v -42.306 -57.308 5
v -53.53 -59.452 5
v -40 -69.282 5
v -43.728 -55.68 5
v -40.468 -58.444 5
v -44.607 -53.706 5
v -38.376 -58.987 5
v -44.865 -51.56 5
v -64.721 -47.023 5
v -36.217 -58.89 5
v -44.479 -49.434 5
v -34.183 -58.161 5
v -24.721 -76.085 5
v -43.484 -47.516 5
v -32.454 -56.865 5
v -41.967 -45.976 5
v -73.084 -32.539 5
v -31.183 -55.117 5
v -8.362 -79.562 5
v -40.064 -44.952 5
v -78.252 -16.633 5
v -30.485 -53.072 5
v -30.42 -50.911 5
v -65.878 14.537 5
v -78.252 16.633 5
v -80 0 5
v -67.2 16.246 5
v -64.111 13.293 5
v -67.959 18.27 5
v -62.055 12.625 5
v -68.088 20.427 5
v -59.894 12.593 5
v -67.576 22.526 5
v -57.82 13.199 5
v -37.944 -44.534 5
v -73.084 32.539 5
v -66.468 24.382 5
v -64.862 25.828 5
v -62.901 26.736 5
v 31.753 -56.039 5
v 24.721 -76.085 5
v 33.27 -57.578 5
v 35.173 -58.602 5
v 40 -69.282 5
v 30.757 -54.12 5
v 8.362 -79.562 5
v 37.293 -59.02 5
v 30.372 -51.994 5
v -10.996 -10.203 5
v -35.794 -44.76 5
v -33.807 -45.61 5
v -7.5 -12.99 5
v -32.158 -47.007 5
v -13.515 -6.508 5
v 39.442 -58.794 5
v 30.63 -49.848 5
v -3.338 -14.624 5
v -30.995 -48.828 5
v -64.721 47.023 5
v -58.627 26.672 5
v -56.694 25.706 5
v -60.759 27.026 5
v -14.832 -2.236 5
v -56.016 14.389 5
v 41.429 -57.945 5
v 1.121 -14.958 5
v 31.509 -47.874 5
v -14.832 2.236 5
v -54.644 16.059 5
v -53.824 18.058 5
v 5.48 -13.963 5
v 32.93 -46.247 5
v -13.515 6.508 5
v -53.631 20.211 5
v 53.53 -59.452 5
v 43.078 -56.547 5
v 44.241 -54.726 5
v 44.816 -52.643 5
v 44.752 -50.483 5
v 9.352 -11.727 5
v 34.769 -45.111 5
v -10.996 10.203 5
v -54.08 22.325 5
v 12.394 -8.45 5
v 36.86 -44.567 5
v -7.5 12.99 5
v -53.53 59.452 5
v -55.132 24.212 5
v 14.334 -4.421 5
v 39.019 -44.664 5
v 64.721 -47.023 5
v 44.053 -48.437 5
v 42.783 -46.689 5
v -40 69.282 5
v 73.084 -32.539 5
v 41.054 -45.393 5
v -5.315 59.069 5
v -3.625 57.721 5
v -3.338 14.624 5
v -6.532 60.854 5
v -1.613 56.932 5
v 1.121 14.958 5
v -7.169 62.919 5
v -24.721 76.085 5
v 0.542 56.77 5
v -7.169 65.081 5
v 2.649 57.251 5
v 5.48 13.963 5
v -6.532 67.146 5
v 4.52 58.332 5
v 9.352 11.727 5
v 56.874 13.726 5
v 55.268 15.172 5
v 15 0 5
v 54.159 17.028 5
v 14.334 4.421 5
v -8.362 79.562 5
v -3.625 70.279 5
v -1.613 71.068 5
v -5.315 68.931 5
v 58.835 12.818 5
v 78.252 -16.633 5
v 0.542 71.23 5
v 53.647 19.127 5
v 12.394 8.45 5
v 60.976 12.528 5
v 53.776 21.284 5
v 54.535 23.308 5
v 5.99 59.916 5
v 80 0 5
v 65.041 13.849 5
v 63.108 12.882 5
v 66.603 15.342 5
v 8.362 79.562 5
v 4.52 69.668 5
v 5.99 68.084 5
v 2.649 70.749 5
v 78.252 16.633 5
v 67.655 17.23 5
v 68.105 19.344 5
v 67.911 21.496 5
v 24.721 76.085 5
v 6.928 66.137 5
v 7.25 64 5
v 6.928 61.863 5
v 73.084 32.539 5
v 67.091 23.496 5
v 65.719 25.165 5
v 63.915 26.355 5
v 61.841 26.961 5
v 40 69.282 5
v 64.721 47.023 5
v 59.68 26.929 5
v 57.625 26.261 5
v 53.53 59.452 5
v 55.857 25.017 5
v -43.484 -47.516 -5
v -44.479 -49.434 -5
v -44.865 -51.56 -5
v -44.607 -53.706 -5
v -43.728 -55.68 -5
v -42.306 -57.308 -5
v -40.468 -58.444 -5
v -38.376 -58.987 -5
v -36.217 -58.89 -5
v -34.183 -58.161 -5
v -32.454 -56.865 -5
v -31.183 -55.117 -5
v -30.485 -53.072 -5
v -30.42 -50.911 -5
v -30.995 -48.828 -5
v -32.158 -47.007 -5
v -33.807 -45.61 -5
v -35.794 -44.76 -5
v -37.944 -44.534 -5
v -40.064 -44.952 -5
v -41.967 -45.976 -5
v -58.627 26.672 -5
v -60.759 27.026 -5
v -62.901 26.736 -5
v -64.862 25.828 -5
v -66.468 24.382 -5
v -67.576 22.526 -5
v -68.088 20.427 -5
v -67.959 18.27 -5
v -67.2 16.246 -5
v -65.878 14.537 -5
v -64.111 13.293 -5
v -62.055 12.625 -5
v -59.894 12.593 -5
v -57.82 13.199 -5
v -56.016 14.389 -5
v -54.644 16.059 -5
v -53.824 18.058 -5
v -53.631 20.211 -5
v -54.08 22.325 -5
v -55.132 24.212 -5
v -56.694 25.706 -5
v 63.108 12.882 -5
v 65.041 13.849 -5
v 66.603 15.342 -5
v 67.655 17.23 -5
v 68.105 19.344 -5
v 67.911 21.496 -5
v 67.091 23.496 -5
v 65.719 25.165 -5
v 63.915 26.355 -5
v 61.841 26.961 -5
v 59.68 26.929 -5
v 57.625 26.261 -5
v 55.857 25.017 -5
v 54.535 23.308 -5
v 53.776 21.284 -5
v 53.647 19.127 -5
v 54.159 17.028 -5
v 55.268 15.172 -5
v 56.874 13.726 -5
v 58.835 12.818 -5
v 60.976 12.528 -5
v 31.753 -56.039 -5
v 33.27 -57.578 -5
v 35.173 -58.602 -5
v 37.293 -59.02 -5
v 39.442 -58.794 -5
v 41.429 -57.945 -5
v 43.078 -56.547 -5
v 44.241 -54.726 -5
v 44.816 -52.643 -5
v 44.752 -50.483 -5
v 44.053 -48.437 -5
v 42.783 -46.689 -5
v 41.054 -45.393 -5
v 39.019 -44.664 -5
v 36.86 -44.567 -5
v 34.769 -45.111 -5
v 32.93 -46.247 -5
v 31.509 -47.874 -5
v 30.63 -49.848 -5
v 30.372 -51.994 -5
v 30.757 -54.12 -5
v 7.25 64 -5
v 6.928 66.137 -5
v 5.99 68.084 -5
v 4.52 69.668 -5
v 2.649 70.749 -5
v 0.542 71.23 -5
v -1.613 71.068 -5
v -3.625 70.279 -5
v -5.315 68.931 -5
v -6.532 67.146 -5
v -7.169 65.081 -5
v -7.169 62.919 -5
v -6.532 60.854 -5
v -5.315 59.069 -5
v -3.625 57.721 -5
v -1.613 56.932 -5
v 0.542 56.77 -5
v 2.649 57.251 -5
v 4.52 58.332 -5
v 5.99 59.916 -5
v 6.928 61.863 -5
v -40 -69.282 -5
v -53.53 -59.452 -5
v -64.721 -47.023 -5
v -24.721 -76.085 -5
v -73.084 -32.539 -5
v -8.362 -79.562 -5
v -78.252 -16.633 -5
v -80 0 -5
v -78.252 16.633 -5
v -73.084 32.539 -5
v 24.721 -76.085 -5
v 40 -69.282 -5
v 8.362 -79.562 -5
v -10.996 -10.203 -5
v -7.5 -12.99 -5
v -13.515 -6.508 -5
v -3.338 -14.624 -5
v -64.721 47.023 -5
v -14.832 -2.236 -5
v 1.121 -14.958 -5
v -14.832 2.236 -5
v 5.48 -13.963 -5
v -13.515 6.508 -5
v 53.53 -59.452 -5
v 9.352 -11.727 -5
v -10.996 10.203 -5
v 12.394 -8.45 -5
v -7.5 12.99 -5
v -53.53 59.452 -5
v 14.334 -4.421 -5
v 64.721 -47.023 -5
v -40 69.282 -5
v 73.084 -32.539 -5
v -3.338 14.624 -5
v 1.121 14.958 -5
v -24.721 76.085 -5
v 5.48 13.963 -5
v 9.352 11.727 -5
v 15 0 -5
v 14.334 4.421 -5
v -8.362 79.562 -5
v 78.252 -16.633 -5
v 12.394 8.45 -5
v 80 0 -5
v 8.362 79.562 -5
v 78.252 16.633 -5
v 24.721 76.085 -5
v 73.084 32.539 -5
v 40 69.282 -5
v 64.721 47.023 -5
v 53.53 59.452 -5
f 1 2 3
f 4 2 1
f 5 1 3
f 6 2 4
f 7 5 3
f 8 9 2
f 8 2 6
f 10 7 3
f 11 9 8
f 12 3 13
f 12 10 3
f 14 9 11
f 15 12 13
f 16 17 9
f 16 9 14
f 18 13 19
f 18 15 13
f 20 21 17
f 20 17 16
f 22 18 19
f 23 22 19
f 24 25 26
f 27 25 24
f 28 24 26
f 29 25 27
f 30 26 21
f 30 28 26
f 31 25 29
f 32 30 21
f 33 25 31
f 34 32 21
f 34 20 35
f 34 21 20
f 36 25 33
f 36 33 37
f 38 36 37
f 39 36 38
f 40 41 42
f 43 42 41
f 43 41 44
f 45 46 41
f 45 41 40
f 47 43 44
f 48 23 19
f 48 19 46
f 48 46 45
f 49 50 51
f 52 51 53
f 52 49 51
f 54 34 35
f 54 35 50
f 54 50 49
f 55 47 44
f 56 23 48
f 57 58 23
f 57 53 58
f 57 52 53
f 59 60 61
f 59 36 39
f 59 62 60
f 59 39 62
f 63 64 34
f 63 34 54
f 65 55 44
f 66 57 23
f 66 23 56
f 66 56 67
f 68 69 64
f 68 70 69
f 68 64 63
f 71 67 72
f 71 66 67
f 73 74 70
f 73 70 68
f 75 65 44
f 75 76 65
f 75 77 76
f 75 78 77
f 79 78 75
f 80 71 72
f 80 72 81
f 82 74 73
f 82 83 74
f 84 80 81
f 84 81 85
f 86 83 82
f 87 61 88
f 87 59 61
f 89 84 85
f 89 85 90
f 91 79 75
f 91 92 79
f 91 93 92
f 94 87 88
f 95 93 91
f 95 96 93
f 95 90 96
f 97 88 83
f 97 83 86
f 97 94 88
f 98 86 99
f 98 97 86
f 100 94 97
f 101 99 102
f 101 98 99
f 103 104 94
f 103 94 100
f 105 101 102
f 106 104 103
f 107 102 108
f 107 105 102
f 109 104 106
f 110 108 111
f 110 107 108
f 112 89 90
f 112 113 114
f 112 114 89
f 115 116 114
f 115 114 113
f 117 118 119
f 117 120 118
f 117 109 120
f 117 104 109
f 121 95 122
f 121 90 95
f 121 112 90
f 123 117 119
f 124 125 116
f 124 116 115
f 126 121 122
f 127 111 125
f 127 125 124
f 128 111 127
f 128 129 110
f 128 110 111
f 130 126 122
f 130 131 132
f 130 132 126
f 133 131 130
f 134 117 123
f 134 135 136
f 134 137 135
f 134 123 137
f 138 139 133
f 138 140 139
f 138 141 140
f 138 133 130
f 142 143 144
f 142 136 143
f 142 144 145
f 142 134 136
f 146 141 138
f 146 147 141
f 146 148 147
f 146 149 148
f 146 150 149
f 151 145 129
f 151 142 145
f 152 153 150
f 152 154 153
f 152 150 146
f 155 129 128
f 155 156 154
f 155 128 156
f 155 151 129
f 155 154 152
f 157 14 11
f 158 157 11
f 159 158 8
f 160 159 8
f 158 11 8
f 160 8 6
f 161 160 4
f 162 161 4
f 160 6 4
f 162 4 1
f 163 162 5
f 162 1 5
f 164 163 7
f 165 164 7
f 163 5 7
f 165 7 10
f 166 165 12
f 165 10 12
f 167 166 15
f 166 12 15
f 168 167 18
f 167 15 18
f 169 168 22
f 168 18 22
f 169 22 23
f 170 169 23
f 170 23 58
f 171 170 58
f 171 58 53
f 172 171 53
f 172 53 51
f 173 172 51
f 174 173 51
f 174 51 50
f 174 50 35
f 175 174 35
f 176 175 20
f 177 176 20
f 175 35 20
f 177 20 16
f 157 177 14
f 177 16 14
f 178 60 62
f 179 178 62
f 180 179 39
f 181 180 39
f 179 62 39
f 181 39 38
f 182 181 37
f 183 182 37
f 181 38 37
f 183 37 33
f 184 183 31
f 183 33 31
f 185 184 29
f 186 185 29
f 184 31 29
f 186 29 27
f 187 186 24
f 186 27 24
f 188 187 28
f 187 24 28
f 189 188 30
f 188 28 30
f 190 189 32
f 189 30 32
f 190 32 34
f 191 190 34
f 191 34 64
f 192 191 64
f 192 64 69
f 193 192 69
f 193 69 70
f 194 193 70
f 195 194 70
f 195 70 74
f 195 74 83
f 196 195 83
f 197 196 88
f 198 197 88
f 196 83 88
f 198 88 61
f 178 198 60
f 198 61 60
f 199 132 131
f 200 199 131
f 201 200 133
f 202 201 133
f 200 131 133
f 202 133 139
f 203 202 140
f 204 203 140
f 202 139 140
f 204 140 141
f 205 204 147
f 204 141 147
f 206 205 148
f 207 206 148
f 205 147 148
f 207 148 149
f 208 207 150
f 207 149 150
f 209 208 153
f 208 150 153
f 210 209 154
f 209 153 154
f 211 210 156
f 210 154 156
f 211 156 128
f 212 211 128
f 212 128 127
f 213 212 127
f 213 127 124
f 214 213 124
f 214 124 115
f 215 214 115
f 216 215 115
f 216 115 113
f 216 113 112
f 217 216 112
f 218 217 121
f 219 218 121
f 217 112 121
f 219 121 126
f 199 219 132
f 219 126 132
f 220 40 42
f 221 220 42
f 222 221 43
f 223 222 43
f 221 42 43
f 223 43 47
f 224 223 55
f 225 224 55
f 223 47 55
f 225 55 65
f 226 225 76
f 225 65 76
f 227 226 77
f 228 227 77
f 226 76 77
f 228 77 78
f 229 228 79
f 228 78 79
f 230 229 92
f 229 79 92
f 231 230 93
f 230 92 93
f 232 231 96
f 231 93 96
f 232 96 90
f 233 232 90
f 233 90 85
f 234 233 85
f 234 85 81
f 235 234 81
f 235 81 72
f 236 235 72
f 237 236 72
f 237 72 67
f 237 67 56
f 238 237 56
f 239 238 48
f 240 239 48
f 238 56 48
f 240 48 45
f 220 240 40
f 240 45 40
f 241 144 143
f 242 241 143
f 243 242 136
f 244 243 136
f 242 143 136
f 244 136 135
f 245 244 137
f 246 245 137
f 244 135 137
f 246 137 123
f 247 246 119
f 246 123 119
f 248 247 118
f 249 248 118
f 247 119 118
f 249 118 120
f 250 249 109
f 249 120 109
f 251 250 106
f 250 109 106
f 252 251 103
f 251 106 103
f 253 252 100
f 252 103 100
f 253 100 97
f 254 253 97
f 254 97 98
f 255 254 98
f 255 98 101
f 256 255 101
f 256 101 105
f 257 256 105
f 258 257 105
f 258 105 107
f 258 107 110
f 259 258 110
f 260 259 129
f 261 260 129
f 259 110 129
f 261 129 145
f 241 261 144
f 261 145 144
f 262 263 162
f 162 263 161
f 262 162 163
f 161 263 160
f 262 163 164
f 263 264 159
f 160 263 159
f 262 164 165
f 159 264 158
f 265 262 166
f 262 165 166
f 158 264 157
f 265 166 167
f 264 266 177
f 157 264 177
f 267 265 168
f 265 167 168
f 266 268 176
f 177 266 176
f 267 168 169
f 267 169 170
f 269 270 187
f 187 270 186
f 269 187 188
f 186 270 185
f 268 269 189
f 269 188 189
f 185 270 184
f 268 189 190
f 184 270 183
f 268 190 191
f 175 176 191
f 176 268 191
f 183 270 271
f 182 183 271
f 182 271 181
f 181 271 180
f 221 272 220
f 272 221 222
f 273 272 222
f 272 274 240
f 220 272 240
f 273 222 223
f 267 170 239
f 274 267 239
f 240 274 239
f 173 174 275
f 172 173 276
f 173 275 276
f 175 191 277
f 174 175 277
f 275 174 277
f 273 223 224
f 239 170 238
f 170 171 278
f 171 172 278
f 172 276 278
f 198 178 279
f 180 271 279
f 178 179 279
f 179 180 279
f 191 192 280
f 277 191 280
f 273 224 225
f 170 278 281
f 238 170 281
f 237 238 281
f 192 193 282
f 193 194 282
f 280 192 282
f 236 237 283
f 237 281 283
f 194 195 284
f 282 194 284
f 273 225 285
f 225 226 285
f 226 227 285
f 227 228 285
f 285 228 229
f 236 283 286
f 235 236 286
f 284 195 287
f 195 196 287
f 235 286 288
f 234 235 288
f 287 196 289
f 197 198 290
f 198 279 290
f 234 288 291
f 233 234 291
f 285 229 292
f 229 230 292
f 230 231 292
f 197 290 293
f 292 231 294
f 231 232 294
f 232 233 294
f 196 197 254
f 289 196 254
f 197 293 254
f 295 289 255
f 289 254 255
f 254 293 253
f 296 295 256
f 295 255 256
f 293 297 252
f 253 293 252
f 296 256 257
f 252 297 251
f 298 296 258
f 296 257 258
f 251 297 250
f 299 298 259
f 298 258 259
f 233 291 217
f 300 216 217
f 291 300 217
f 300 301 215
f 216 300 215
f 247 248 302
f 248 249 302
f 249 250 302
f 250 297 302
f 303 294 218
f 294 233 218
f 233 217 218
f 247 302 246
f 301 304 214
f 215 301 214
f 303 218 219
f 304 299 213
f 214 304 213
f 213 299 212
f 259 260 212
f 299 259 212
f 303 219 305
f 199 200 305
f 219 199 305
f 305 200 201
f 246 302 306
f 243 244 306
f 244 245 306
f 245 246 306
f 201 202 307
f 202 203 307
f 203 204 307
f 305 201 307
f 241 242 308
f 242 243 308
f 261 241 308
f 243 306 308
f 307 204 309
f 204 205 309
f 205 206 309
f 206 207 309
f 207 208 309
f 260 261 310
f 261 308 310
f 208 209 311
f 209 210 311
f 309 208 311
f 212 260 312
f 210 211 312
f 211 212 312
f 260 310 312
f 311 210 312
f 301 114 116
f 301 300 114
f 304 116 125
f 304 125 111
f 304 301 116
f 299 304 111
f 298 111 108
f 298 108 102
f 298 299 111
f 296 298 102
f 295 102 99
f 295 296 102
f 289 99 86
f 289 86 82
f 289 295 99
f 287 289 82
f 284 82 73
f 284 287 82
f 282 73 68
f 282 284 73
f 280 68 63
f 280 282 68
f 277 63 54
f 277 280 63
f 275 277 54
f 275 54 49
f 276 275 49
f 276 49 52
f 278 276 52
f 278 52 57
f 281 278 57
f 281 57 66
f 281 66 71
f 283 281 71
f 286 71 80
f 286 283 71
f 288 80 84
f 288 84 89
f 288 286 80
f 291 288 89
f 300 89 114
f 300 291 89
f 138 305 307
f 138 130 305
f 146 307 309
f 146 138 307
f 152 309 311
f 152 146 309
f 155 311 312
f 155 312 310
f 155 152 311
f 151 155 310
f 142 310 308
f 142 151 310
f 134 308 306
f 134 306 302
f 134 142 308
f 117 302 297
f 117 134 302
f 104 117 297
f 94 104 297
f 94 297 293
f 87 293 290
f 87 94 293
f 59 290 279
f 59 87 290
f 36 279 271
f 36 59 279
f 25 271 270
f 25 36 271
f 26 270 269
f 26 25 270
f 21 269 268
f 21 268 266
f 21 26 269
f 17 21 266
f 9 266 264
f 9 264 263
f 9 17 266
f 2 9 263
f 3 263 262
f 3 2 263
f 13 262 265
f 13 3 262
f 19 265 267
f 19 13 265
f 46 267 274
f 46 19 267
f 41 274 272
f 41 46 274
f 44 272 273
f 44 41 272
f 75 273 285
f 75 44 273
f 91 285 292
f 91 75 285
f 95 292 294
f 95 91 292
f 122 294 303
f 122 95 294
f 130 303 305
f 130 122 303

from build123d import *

# Parameters (mm, degrees)
ESQUISSE1_R                  = 80
ESQUISSE1_R_2                = 15
BOSS_EXTRU_1_DEPTH           = 5
ESQUISSE3_R                  = 7.25
ENL_V_MAT_EXTRU_1_DEPTH      = 10
R_P_TITION_CIRCULAIRE4_COUNT = 5


with BuildPart() as part:
    # Esquisse1 → Boss.-Extru.1 (new body, symmetric)
    with BuildSketch(Plane.XY):
        Circle(ESQUISSE1_R)
        Circle(ESQUISSE1_R_2, mode=Mode.SUBTRACT)
    extrude(amount=BOSS_EXTRU_1_DEPTH, both=True)

    # Esquisse3 → Enlèv. mat.-Extru.1 (cut)
    with BuildSketch(Plane.XY.offset(5)):
        with Locations((0, 64)):
            Circle(ESQUISSE3_R)
    enl_v_mat_extru_1 = extrude(amount=-ENL_V_MAT_EXTRU_1_DEPTH, mode=Mode.SUBTRACT)

    # Répétition circulaire4: Enlèv. mat.-Extru.1 ×5 about axis
    r_p_tition_circulaire4_axis = Axis((0, 0, 0), (0, 0, 1))
    for i in range(1, R_P_TITION_CIRCULAIRE4_COUNT):
        add(enl_v_mat_extru_1.rotate(r_p_tition_circulaire4_axis, i * 360 / R_P_TITION_CIRCULAIRE4_COUNT), mode=Mode.SUBTRACT)


solid = part.part
